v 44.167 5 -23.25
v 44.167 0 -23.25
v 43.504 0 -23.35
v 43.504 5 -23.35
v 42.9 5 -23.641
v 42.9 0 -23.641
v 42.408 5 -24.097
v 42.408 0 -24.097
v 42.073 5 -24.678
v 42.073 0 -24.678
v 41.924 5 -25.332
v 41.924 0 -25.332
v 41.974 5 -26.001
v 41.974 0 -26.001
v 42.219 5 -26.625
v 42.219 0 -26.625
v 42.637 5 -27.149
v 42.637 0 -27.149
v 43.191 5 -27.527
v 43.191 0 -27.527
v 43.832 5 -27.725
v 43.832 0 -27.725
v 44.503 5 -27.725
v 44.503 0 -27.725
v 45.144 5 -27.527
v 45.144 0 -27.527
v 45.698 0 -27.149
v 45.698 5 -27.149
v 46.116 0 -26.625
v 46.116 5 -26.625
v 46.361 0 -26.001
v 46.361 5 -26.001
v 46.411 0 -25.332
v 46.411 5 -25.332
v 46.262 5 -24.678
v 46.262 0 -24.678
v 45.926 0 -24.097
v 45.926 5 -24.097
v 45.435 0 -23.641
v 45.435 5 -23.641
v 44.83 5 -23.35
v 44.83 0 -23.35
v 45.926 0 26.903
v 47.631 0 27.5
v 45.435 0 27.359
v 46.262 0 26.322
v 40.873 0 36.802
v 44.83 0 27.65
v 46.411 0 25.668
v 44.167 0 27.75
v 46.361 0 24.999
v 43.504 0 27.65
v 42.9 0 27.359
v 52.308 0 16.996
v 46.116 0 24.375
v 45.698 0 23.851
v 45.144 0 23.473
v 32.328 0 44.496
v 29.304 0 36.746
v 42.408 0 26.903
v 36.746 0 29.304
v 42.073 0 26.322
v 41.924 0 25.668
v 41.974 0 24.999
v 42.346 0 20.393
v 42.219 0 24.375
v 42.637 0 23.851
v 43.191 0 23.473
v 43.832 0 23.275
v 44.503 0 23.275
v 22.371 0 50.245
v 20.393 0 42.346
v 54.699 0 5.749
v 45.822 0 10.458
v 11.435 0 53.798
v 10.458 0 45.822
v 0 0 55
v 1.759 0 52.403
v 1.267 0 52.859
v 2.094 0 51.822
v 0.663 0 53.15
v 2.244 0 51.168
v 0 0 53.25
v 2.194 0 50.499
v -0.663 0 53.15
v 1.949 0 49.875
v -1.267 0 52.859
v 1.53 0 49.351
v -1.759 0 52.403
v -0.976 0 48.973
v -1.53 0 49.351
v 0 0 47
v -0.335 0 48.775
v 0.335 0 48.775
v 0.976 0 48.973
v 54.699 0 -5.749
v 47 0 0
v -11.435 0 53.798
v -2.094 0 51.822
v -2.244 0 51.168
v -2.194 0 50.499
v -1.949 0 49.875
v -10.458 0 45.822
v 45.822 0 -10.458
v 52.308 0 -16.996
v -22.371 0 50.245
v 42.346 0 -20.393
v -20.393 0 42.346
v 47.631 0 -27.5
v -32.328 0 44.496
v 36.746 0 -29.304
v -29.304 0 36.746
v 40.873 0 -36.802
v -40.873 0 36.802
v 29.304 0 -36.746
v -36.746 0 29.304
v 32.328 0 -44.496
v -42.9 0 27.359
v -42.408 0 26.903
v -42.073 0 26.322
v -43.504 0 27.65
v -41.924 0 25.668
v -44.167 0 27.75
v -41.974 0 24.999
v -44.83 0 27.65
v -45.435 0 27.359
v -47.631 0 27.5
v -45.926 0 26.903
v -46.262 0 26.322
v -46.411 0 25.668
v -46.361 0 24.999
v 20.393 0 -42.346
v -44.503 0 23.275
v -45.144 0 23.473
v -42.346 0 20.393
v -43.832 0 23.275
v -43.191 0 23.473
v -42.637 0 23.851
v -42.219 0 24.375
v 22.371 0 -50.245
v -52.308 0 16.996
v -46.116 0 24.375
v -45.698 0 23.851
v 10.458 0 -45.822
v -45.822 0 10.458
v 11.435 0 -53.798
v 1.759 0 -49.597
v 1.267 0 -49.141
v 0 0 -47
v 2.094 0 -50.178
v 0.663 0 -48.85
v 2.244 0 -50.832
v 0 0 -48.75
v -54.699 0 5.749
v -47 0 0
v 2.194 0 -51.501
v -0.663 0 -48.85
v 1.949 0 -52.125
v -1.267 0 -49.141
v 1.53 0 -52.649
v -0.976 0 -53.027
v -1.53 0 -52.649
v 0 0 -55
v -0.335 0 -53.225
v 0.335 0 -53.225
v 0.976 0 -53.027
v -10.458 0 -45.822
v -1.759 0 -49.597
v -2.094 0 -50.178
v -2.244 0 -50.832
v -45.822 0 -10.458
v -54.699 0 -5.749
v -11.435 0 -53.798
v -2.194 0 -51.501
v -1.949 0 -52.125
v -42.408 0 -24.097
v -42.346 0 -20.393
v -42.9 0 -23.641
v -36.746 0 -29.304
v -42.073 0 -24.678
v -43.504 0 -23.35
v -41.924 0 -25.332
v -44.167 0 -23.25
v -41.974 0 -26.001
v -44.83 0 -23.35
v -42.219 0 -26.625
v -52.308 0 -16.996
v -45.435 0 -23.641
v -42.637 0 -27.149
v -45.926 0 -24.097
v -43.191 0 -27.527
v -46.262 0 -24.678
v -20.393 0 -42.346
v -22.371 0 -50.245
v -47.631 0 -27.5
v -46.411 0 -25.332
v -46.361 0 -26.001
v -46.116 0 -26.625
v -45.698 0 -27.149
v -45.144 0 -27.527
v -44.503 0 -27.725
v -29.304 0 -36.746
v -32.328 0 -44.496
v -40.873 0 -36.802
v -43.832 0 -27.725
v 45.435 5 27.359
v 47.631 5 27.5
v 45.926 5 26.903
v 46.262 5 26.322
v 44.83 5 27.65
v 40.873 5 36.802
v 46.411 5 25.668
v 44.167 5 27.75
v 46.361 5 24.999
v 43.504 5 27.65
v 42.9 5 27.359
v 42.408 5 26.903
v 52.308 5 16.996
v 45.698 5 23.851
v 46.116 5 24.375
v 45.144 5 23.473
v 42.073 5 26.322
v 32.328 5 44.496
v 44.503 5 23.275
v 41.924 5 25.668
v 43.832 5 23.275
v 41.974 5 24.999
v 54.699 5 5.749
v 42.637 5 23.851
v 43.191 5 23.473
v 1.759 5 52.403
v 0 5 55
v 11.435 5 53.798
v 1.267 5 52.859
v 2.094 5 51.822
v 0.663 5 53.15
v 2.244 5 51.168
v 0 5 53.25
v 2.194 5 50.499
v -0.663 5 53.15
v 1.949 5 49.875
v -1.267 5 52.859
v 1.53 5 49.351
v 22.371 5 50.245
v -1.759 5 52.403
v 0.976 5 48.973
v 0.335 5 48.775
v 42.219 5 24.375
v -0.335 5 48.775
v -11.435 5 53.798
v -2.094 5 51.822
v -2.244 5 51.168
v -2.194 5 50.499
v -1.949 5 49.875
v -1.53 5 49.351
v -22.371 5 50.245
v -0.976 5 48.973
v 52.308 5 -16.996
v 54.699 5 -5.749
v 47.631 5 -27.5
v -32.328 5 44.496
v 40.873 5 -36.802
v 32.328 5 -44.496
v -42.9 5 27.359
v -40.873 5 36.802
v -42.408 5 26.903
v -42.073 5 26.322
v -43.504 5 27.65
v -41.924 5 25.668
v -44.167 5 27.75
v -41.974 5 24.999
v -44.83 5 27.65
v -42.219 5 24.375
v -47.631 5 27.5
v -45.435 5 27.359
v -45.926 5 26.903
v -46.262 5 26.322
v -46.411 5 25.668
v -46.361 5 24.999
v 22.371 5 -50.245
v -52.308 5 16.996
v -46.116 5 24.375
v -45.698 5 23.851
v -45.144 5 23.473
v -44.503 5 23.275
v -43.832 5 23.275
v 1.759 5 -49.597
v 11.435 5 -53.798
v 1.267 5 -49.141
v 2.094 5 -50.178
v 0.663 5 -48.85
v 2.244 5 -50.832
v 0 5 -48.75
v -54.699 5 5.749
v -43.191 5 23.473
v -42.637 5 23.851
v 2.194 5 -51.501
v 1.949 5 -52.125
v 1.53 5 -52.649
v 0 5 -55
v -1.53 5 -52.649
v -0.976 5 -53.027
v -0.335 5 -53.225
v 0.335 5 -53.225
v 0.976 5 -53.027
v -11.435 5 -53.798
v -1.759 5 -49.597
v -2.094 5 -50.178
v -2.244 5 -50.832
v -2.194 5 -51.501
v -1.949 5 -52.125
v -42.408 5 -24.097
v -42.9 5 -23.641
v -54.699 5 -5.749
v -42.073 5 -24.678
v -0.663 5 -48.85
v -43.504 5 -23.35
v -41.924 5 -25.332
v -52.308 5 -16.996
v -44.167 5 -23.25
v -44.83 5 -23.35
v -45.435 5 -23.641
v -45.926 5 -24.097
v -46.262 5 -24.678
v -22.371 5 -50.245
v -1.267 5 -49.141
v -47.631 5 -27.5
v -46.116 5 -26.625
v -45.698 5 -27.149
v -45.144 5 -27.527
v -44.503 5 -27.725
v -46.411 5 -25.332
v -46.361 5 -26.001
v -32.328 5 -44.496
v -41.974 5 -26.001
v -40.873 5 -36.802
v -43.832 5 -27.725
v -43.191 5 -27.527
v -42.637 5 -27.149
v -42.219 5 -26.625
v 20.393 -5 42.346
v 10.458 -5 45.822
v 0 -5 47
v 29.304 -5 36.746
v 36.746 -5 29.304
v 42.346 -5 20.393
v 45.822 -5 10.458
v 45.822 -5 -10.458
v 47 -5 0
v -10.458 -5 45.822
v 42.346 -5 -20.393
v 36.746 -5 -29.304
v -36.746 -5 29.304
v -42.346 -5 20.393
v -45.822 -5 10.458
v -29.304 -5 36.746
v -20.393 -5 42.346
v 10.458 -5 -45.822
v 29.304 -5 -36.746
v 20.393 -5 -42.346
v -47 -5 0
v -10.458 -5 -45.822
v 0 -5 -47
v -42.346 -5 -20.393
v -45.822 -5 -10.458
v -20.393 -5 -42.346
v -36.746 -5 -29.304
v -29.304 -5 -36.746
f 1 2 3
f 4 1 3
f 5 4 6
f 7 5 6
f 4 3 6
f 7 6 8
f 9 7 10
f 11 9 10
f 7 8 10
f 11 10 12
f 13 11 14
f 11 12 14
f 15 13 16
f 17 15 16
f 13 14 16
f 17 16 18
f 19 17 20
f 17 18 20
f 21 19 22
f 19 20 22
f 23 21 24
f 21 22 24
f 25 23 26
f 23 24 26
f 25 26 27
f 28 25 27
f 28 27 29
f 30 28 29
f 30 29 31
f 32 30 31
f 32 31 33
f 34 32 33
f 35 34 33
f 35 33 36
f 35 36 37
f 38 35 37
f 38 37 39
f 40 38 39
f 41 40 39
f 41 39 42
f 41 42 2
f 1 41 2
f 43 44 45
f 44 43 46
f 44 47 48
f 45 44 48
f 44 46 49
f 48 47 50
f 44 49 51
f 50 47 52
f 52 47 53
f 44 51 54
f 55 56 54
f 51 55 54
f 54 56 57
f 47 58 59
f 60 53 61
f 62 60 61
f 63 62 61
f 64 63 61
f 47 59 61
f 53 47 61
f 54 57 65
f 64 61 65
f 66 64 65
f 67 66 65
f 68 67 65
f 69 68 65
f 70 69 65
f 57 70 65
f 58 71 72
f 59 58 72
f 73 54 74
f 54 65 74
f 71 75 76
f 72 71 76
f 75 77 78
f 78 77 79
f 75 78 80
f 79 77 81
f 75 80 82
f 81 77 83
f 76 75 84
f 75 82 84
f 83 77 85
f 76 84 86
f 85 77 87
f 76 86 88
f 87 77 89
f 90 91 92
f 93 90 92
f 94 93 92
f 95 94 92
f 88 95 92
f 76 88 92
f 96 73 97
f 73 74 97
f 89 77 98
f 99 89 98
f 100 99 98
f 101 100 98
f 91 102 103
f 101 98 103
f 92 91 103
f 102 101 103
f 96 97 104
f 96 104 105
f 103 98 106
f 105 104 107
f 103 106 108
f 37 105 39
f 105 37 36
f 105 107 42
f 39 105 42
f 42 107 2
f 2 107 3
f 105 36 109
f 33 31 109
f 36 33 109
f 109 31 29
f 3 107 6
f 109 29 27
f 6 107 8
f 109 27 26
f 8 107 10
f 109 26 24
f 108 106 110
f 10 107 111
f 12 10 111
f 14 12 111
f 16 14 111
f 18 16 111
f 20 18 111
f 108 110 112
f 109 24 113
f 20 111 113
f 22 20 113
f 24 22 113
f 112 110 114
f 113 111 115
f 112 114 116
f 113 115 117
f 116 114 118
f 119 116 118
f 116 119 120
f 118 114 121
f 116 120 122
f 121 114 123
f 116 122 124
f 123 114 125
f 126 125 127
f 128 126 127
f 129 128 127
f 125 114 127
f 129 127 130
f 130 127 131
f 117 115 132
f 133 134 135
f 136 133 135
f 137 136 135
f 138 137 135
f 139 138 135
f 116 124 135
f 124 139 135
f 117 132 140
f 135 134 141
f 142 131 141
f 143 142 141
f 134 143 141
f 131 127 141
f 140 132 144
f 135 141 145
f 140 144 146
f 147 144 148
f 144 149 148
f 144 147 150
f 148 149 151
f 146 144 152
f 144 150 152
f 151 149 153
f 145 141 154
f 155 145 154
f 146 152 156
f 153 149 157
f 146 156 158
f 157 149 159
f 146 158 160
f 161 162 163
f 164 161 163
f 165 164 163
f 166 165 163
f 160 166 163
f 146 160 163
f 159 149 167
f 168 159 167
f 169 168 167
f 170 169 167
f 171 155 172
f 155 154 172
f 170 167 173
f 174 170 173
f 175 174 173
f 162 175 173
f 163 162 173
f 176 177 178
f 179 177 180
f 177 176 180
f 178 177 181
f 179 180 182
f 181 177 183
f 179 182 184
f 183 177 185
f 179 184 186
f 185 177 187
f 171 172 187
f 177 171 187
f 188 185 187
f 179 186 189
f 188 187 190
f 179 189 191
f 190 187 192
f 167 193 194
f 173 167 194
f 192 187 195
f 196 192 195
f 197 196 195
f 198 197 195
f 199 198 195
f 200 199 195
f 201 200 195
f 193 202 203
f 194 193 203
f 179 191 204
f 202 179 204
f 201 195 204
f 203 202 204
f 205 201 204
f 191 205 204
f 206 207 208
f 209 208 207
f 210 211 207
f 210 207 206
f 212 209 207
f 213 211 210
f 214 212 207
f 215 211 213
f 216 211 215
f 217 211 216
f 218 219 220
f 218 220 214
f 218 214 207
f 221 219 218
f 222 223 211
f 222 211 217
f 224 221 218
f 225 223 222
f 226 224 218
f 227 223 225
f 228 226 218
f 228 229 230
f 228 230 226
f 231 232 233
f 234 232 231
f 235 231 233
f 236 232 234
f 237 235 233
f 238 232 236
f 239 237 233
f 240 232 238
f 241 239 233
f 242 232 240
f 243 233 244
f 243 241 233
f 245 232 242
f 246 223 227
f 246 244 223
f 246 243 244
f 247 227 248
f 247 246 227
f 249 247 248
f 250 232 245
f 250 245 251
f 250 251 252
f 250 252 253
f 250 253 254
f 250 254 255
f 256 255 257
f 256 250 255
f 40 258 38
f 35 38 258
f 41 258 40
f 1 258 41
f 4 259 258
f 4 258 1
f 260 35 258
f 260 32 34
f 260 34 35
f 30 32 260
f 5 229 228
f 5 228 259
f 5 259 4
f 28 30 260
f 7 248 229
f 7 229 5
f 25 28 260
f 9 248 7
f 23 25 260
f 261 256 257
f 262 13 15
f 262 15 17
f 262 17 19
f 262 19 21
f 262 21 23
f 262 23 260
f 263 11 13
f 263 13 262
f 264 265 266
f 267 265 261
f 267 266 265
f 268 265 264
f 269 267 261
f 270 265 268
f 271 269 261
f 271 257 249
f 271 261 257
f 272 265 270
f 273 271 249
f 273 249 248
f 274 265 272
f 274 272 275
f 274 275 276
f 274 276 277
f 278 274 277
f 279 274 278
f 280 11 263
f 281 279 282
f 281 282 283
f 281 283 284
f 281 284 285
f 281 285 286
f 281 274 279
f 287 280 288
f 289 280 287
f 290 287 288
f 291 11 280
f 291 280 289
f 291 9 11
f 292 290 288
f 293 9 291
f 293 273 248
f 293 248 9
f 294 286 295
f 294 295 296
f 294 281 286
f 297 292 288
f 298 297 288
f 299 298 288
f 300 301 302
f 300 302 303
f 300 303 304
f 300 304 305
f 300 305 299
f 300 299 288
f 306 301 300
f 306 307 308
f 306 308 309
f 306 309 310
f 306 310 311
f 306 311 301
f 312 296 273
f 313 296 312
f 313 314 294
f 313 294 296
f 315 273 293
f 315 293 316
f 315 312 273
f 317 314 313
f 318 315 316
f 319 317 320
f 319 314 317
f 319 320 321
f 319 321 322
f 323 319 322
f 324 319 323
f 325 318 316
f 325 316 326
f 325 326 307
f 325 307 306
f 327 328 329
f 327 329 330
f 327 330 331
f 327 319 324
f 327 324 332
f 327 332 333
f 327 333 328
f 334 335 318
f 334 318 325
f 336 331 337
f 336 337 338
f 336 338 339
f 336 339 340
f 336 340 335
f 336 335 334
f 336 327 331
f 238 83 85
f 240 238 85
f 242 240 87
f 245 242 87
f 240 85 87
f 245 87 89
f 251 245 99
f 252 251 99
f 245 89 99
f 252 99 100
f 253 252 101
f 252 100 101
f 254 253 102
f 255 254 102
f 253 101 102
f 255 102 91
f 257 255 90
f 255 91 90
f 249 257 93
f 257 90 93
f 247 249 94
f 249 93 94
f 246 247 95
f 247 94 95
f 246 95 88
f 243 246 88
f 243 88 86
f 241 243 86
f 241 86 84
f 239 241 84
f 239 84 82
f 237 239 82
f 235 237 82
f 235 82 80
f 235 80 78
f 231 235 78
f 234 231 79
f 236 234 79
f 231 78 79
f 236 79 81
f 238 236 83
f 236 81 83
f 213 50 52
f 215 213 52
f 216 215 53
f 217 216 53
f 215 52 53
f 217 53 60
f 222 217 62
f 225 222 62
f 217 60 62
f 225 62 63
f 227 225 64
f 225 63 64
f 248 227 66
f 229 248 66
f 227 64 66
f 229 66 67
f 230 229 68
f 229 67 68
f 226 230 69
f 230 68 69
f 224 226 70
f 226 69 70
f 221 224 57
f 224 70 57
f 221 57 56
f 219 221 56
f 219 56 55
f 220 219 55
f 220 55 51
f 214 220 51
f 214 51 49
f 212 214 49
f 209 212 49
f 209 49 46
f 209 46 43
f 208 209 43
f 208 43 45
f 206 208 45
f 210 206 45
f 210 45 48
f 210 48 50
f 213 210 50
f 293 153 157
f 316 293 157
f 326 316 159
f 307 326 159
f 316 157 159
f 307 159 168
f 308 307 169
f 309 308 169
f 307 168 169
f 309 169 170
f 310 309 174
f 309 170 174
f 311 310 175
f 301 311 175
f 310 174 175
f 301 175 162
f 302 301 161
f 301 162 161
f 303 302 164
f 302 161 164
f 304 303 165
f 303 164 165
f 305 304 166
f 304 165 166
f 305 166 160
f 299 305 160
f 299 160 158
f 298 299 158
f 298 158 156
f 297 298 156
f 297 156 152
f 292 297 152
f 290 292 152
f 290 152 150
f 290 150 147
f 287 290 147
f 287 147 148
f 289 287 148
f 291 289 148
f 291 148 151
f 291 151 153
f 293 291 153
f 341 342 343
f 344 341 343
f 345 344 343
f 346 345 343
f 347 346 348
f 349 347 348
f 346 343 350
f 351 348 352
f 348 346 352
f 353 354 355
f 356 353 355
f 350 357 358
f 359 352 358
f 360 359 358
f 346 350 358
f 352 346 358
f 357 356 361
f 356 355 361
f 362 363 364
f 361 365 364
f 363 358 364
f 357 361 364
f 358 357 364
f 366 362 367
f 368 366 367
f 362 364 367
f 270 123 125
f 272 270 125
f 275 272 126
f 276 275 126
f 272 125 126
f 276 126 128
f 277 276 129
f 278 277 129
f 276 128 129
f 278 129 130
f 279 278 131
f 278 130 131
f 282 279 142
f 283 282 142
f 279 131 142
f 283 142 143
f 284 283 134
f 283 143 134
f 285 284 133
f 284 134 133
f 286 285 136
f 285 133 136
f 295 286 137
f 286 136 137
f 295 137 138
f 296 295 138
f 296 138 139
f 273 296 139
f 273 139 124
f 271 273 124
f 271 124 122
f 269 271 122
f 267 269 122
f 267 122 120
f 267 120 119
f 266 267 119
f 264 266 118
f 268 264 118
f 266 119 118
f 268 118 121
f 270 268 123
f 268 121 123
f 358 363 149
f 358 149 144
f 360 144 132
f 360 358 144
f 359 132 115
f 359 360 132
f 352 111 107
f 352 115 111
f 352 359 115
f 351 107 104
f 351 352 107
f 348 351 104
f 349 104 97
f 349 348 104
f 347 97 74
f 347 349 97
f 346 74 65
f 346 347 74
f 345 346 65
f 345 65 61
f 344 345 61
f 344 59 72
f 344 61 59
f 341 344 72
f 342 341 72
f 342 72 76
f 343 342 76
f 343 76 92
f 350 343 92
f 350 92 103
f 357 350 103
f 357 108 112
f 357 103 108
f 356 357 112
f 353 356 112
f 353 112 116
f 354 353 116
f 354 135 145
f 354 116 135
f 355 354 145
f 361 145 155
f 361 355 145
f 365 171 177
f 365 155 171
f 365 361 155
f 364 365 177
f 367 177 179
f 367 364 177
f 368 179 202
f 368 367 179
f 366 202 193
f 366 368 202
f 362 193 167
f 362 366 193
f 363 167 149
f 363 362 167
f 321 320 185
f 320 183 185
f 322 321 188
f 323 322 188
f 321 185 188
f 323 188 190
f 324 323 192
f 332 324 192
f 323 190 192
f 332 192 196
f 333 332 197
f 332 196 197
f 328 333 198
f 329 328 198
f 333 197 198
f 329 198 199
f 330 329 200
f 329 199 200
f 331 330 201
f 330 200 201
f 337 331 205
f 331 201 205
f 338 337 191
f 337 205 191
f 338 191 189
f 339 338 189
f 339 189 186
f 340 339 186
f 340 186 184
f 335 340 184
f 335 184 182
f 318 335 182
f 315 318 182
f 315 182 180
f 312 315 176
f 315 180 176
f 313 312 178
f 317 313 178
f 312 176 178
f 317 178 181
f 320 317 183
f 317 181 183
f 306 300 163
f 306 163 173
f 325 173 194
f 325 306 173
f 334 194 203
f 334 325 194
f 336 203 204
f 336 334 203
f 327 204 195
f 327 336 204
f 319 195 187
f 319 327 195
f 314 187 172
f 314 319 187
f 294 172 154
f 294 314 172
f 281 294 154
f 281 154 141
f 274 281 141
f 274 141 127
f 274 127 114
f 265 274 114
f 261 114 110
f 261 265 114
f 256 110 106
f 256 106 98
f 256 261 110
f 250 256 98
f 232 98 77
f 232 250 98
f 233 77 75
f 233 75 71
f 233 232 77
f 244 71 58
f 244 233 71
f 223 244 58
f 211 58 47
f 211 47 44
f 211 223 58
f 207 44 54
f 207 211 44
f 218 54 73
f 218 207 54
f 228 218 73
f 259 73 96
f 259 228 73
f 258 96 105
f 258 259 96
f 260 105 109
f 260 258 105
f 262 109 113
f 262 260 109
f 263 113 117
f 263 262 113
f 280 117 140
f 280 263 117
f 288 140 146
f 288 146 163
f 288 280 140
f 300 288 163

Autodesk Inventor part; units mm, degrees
ref_plane "YZ Plane" through (0, 0, 0) normal (1, 0, 0) x (0, 1, 0)
ref_plane "XZ Plane" through (0, 0, 0) normal (0, 1, 0) x (-1, 0, 0)
ref_plane "XY Plane" through (0, 0, 0) normal (0, 0, 1) x (1, 0, 0)
sketch "Skizze1" plane through (0, 0, 0) normal (1, 0, 0) x (0, 1, 0)
  line L0 (5, -20) -> (5, -25)
  line L1 (5, -20) -> (0, -20)
  line L2 (0, -20) -> (0, -55)
  line L3 (0, -55) -> (5, -55)
  line L4 (5, -55) -> (5, -20)
  line L5 (0, -42) -> (0, -47)
  line L6 (0, -37.5) -> (0, -42)
  line L7 (-8, 0) -> (13, 0) projected
  line L8 (0, -66) -> (0, 11) projected
  line L9 (5, -20) -> (0, -20)
  line L10 (0, -20) -> (0, 0)
  line L11 (0, 0) -> (5, 0)
  line L12 (5, 0) -> (5, -20)
  line L13 (-5, 0) -> (0, 0)
  line L14 (0, 0) -> (0, -47)
  line L15 (0, -47) -> (-5, -47)
  line L16 (-5, -47) -> (-5, 0)
  point P0 (10, -25)
  point P1 (10, -20)
  point P2 (0, -44.5)
  point P3 (2.5, -55)
  point P4 (-2.5, -47)
  dimension "d1" = 5
  dimension "d10" = 0
  dimension "d26" = 5
  dimension "d27" = 47
revolve "Umdrehung1" add sketch "Skizze1" angle 360 about axis through (0, -10, 0) along (0, 1, 0)
sketch "Skizze2" plane through (0, 5, 0) normal (0, 1, 0) x (1, 0, 0)
  line L0 (-77, 0) -> (77, 0) projected
  line L1 (0, 77) -> (0, -77) projected
  circle A0 centre (0, 0) radius 51
  circle A1 centre (0, 0) radius 55 projected
  point P0 (0, -51)
  point P1 (44.1673, -25.5)
  point P2 (44.1673, 25.5)
  point P3 (0, 51)
  point P4 (-44.1673, 25.5)
  point P5 (-44.1673, -25.5)
  dimension "d14" = 4
  dimension "d17" = 360
hole "Bohrung1" at (0, 5, 51) at (44.1673, 5, 25.5) at (44.1673, 5, -25.5) at (0, 5, -51) at (-44.1673, 5, -25.5) at (-44.1673, 5, 25.5) direction (0, -1, 0) diameter 4.5 depth 11.8 tip angle 118
properties part number "Deckel Stempel 2"
